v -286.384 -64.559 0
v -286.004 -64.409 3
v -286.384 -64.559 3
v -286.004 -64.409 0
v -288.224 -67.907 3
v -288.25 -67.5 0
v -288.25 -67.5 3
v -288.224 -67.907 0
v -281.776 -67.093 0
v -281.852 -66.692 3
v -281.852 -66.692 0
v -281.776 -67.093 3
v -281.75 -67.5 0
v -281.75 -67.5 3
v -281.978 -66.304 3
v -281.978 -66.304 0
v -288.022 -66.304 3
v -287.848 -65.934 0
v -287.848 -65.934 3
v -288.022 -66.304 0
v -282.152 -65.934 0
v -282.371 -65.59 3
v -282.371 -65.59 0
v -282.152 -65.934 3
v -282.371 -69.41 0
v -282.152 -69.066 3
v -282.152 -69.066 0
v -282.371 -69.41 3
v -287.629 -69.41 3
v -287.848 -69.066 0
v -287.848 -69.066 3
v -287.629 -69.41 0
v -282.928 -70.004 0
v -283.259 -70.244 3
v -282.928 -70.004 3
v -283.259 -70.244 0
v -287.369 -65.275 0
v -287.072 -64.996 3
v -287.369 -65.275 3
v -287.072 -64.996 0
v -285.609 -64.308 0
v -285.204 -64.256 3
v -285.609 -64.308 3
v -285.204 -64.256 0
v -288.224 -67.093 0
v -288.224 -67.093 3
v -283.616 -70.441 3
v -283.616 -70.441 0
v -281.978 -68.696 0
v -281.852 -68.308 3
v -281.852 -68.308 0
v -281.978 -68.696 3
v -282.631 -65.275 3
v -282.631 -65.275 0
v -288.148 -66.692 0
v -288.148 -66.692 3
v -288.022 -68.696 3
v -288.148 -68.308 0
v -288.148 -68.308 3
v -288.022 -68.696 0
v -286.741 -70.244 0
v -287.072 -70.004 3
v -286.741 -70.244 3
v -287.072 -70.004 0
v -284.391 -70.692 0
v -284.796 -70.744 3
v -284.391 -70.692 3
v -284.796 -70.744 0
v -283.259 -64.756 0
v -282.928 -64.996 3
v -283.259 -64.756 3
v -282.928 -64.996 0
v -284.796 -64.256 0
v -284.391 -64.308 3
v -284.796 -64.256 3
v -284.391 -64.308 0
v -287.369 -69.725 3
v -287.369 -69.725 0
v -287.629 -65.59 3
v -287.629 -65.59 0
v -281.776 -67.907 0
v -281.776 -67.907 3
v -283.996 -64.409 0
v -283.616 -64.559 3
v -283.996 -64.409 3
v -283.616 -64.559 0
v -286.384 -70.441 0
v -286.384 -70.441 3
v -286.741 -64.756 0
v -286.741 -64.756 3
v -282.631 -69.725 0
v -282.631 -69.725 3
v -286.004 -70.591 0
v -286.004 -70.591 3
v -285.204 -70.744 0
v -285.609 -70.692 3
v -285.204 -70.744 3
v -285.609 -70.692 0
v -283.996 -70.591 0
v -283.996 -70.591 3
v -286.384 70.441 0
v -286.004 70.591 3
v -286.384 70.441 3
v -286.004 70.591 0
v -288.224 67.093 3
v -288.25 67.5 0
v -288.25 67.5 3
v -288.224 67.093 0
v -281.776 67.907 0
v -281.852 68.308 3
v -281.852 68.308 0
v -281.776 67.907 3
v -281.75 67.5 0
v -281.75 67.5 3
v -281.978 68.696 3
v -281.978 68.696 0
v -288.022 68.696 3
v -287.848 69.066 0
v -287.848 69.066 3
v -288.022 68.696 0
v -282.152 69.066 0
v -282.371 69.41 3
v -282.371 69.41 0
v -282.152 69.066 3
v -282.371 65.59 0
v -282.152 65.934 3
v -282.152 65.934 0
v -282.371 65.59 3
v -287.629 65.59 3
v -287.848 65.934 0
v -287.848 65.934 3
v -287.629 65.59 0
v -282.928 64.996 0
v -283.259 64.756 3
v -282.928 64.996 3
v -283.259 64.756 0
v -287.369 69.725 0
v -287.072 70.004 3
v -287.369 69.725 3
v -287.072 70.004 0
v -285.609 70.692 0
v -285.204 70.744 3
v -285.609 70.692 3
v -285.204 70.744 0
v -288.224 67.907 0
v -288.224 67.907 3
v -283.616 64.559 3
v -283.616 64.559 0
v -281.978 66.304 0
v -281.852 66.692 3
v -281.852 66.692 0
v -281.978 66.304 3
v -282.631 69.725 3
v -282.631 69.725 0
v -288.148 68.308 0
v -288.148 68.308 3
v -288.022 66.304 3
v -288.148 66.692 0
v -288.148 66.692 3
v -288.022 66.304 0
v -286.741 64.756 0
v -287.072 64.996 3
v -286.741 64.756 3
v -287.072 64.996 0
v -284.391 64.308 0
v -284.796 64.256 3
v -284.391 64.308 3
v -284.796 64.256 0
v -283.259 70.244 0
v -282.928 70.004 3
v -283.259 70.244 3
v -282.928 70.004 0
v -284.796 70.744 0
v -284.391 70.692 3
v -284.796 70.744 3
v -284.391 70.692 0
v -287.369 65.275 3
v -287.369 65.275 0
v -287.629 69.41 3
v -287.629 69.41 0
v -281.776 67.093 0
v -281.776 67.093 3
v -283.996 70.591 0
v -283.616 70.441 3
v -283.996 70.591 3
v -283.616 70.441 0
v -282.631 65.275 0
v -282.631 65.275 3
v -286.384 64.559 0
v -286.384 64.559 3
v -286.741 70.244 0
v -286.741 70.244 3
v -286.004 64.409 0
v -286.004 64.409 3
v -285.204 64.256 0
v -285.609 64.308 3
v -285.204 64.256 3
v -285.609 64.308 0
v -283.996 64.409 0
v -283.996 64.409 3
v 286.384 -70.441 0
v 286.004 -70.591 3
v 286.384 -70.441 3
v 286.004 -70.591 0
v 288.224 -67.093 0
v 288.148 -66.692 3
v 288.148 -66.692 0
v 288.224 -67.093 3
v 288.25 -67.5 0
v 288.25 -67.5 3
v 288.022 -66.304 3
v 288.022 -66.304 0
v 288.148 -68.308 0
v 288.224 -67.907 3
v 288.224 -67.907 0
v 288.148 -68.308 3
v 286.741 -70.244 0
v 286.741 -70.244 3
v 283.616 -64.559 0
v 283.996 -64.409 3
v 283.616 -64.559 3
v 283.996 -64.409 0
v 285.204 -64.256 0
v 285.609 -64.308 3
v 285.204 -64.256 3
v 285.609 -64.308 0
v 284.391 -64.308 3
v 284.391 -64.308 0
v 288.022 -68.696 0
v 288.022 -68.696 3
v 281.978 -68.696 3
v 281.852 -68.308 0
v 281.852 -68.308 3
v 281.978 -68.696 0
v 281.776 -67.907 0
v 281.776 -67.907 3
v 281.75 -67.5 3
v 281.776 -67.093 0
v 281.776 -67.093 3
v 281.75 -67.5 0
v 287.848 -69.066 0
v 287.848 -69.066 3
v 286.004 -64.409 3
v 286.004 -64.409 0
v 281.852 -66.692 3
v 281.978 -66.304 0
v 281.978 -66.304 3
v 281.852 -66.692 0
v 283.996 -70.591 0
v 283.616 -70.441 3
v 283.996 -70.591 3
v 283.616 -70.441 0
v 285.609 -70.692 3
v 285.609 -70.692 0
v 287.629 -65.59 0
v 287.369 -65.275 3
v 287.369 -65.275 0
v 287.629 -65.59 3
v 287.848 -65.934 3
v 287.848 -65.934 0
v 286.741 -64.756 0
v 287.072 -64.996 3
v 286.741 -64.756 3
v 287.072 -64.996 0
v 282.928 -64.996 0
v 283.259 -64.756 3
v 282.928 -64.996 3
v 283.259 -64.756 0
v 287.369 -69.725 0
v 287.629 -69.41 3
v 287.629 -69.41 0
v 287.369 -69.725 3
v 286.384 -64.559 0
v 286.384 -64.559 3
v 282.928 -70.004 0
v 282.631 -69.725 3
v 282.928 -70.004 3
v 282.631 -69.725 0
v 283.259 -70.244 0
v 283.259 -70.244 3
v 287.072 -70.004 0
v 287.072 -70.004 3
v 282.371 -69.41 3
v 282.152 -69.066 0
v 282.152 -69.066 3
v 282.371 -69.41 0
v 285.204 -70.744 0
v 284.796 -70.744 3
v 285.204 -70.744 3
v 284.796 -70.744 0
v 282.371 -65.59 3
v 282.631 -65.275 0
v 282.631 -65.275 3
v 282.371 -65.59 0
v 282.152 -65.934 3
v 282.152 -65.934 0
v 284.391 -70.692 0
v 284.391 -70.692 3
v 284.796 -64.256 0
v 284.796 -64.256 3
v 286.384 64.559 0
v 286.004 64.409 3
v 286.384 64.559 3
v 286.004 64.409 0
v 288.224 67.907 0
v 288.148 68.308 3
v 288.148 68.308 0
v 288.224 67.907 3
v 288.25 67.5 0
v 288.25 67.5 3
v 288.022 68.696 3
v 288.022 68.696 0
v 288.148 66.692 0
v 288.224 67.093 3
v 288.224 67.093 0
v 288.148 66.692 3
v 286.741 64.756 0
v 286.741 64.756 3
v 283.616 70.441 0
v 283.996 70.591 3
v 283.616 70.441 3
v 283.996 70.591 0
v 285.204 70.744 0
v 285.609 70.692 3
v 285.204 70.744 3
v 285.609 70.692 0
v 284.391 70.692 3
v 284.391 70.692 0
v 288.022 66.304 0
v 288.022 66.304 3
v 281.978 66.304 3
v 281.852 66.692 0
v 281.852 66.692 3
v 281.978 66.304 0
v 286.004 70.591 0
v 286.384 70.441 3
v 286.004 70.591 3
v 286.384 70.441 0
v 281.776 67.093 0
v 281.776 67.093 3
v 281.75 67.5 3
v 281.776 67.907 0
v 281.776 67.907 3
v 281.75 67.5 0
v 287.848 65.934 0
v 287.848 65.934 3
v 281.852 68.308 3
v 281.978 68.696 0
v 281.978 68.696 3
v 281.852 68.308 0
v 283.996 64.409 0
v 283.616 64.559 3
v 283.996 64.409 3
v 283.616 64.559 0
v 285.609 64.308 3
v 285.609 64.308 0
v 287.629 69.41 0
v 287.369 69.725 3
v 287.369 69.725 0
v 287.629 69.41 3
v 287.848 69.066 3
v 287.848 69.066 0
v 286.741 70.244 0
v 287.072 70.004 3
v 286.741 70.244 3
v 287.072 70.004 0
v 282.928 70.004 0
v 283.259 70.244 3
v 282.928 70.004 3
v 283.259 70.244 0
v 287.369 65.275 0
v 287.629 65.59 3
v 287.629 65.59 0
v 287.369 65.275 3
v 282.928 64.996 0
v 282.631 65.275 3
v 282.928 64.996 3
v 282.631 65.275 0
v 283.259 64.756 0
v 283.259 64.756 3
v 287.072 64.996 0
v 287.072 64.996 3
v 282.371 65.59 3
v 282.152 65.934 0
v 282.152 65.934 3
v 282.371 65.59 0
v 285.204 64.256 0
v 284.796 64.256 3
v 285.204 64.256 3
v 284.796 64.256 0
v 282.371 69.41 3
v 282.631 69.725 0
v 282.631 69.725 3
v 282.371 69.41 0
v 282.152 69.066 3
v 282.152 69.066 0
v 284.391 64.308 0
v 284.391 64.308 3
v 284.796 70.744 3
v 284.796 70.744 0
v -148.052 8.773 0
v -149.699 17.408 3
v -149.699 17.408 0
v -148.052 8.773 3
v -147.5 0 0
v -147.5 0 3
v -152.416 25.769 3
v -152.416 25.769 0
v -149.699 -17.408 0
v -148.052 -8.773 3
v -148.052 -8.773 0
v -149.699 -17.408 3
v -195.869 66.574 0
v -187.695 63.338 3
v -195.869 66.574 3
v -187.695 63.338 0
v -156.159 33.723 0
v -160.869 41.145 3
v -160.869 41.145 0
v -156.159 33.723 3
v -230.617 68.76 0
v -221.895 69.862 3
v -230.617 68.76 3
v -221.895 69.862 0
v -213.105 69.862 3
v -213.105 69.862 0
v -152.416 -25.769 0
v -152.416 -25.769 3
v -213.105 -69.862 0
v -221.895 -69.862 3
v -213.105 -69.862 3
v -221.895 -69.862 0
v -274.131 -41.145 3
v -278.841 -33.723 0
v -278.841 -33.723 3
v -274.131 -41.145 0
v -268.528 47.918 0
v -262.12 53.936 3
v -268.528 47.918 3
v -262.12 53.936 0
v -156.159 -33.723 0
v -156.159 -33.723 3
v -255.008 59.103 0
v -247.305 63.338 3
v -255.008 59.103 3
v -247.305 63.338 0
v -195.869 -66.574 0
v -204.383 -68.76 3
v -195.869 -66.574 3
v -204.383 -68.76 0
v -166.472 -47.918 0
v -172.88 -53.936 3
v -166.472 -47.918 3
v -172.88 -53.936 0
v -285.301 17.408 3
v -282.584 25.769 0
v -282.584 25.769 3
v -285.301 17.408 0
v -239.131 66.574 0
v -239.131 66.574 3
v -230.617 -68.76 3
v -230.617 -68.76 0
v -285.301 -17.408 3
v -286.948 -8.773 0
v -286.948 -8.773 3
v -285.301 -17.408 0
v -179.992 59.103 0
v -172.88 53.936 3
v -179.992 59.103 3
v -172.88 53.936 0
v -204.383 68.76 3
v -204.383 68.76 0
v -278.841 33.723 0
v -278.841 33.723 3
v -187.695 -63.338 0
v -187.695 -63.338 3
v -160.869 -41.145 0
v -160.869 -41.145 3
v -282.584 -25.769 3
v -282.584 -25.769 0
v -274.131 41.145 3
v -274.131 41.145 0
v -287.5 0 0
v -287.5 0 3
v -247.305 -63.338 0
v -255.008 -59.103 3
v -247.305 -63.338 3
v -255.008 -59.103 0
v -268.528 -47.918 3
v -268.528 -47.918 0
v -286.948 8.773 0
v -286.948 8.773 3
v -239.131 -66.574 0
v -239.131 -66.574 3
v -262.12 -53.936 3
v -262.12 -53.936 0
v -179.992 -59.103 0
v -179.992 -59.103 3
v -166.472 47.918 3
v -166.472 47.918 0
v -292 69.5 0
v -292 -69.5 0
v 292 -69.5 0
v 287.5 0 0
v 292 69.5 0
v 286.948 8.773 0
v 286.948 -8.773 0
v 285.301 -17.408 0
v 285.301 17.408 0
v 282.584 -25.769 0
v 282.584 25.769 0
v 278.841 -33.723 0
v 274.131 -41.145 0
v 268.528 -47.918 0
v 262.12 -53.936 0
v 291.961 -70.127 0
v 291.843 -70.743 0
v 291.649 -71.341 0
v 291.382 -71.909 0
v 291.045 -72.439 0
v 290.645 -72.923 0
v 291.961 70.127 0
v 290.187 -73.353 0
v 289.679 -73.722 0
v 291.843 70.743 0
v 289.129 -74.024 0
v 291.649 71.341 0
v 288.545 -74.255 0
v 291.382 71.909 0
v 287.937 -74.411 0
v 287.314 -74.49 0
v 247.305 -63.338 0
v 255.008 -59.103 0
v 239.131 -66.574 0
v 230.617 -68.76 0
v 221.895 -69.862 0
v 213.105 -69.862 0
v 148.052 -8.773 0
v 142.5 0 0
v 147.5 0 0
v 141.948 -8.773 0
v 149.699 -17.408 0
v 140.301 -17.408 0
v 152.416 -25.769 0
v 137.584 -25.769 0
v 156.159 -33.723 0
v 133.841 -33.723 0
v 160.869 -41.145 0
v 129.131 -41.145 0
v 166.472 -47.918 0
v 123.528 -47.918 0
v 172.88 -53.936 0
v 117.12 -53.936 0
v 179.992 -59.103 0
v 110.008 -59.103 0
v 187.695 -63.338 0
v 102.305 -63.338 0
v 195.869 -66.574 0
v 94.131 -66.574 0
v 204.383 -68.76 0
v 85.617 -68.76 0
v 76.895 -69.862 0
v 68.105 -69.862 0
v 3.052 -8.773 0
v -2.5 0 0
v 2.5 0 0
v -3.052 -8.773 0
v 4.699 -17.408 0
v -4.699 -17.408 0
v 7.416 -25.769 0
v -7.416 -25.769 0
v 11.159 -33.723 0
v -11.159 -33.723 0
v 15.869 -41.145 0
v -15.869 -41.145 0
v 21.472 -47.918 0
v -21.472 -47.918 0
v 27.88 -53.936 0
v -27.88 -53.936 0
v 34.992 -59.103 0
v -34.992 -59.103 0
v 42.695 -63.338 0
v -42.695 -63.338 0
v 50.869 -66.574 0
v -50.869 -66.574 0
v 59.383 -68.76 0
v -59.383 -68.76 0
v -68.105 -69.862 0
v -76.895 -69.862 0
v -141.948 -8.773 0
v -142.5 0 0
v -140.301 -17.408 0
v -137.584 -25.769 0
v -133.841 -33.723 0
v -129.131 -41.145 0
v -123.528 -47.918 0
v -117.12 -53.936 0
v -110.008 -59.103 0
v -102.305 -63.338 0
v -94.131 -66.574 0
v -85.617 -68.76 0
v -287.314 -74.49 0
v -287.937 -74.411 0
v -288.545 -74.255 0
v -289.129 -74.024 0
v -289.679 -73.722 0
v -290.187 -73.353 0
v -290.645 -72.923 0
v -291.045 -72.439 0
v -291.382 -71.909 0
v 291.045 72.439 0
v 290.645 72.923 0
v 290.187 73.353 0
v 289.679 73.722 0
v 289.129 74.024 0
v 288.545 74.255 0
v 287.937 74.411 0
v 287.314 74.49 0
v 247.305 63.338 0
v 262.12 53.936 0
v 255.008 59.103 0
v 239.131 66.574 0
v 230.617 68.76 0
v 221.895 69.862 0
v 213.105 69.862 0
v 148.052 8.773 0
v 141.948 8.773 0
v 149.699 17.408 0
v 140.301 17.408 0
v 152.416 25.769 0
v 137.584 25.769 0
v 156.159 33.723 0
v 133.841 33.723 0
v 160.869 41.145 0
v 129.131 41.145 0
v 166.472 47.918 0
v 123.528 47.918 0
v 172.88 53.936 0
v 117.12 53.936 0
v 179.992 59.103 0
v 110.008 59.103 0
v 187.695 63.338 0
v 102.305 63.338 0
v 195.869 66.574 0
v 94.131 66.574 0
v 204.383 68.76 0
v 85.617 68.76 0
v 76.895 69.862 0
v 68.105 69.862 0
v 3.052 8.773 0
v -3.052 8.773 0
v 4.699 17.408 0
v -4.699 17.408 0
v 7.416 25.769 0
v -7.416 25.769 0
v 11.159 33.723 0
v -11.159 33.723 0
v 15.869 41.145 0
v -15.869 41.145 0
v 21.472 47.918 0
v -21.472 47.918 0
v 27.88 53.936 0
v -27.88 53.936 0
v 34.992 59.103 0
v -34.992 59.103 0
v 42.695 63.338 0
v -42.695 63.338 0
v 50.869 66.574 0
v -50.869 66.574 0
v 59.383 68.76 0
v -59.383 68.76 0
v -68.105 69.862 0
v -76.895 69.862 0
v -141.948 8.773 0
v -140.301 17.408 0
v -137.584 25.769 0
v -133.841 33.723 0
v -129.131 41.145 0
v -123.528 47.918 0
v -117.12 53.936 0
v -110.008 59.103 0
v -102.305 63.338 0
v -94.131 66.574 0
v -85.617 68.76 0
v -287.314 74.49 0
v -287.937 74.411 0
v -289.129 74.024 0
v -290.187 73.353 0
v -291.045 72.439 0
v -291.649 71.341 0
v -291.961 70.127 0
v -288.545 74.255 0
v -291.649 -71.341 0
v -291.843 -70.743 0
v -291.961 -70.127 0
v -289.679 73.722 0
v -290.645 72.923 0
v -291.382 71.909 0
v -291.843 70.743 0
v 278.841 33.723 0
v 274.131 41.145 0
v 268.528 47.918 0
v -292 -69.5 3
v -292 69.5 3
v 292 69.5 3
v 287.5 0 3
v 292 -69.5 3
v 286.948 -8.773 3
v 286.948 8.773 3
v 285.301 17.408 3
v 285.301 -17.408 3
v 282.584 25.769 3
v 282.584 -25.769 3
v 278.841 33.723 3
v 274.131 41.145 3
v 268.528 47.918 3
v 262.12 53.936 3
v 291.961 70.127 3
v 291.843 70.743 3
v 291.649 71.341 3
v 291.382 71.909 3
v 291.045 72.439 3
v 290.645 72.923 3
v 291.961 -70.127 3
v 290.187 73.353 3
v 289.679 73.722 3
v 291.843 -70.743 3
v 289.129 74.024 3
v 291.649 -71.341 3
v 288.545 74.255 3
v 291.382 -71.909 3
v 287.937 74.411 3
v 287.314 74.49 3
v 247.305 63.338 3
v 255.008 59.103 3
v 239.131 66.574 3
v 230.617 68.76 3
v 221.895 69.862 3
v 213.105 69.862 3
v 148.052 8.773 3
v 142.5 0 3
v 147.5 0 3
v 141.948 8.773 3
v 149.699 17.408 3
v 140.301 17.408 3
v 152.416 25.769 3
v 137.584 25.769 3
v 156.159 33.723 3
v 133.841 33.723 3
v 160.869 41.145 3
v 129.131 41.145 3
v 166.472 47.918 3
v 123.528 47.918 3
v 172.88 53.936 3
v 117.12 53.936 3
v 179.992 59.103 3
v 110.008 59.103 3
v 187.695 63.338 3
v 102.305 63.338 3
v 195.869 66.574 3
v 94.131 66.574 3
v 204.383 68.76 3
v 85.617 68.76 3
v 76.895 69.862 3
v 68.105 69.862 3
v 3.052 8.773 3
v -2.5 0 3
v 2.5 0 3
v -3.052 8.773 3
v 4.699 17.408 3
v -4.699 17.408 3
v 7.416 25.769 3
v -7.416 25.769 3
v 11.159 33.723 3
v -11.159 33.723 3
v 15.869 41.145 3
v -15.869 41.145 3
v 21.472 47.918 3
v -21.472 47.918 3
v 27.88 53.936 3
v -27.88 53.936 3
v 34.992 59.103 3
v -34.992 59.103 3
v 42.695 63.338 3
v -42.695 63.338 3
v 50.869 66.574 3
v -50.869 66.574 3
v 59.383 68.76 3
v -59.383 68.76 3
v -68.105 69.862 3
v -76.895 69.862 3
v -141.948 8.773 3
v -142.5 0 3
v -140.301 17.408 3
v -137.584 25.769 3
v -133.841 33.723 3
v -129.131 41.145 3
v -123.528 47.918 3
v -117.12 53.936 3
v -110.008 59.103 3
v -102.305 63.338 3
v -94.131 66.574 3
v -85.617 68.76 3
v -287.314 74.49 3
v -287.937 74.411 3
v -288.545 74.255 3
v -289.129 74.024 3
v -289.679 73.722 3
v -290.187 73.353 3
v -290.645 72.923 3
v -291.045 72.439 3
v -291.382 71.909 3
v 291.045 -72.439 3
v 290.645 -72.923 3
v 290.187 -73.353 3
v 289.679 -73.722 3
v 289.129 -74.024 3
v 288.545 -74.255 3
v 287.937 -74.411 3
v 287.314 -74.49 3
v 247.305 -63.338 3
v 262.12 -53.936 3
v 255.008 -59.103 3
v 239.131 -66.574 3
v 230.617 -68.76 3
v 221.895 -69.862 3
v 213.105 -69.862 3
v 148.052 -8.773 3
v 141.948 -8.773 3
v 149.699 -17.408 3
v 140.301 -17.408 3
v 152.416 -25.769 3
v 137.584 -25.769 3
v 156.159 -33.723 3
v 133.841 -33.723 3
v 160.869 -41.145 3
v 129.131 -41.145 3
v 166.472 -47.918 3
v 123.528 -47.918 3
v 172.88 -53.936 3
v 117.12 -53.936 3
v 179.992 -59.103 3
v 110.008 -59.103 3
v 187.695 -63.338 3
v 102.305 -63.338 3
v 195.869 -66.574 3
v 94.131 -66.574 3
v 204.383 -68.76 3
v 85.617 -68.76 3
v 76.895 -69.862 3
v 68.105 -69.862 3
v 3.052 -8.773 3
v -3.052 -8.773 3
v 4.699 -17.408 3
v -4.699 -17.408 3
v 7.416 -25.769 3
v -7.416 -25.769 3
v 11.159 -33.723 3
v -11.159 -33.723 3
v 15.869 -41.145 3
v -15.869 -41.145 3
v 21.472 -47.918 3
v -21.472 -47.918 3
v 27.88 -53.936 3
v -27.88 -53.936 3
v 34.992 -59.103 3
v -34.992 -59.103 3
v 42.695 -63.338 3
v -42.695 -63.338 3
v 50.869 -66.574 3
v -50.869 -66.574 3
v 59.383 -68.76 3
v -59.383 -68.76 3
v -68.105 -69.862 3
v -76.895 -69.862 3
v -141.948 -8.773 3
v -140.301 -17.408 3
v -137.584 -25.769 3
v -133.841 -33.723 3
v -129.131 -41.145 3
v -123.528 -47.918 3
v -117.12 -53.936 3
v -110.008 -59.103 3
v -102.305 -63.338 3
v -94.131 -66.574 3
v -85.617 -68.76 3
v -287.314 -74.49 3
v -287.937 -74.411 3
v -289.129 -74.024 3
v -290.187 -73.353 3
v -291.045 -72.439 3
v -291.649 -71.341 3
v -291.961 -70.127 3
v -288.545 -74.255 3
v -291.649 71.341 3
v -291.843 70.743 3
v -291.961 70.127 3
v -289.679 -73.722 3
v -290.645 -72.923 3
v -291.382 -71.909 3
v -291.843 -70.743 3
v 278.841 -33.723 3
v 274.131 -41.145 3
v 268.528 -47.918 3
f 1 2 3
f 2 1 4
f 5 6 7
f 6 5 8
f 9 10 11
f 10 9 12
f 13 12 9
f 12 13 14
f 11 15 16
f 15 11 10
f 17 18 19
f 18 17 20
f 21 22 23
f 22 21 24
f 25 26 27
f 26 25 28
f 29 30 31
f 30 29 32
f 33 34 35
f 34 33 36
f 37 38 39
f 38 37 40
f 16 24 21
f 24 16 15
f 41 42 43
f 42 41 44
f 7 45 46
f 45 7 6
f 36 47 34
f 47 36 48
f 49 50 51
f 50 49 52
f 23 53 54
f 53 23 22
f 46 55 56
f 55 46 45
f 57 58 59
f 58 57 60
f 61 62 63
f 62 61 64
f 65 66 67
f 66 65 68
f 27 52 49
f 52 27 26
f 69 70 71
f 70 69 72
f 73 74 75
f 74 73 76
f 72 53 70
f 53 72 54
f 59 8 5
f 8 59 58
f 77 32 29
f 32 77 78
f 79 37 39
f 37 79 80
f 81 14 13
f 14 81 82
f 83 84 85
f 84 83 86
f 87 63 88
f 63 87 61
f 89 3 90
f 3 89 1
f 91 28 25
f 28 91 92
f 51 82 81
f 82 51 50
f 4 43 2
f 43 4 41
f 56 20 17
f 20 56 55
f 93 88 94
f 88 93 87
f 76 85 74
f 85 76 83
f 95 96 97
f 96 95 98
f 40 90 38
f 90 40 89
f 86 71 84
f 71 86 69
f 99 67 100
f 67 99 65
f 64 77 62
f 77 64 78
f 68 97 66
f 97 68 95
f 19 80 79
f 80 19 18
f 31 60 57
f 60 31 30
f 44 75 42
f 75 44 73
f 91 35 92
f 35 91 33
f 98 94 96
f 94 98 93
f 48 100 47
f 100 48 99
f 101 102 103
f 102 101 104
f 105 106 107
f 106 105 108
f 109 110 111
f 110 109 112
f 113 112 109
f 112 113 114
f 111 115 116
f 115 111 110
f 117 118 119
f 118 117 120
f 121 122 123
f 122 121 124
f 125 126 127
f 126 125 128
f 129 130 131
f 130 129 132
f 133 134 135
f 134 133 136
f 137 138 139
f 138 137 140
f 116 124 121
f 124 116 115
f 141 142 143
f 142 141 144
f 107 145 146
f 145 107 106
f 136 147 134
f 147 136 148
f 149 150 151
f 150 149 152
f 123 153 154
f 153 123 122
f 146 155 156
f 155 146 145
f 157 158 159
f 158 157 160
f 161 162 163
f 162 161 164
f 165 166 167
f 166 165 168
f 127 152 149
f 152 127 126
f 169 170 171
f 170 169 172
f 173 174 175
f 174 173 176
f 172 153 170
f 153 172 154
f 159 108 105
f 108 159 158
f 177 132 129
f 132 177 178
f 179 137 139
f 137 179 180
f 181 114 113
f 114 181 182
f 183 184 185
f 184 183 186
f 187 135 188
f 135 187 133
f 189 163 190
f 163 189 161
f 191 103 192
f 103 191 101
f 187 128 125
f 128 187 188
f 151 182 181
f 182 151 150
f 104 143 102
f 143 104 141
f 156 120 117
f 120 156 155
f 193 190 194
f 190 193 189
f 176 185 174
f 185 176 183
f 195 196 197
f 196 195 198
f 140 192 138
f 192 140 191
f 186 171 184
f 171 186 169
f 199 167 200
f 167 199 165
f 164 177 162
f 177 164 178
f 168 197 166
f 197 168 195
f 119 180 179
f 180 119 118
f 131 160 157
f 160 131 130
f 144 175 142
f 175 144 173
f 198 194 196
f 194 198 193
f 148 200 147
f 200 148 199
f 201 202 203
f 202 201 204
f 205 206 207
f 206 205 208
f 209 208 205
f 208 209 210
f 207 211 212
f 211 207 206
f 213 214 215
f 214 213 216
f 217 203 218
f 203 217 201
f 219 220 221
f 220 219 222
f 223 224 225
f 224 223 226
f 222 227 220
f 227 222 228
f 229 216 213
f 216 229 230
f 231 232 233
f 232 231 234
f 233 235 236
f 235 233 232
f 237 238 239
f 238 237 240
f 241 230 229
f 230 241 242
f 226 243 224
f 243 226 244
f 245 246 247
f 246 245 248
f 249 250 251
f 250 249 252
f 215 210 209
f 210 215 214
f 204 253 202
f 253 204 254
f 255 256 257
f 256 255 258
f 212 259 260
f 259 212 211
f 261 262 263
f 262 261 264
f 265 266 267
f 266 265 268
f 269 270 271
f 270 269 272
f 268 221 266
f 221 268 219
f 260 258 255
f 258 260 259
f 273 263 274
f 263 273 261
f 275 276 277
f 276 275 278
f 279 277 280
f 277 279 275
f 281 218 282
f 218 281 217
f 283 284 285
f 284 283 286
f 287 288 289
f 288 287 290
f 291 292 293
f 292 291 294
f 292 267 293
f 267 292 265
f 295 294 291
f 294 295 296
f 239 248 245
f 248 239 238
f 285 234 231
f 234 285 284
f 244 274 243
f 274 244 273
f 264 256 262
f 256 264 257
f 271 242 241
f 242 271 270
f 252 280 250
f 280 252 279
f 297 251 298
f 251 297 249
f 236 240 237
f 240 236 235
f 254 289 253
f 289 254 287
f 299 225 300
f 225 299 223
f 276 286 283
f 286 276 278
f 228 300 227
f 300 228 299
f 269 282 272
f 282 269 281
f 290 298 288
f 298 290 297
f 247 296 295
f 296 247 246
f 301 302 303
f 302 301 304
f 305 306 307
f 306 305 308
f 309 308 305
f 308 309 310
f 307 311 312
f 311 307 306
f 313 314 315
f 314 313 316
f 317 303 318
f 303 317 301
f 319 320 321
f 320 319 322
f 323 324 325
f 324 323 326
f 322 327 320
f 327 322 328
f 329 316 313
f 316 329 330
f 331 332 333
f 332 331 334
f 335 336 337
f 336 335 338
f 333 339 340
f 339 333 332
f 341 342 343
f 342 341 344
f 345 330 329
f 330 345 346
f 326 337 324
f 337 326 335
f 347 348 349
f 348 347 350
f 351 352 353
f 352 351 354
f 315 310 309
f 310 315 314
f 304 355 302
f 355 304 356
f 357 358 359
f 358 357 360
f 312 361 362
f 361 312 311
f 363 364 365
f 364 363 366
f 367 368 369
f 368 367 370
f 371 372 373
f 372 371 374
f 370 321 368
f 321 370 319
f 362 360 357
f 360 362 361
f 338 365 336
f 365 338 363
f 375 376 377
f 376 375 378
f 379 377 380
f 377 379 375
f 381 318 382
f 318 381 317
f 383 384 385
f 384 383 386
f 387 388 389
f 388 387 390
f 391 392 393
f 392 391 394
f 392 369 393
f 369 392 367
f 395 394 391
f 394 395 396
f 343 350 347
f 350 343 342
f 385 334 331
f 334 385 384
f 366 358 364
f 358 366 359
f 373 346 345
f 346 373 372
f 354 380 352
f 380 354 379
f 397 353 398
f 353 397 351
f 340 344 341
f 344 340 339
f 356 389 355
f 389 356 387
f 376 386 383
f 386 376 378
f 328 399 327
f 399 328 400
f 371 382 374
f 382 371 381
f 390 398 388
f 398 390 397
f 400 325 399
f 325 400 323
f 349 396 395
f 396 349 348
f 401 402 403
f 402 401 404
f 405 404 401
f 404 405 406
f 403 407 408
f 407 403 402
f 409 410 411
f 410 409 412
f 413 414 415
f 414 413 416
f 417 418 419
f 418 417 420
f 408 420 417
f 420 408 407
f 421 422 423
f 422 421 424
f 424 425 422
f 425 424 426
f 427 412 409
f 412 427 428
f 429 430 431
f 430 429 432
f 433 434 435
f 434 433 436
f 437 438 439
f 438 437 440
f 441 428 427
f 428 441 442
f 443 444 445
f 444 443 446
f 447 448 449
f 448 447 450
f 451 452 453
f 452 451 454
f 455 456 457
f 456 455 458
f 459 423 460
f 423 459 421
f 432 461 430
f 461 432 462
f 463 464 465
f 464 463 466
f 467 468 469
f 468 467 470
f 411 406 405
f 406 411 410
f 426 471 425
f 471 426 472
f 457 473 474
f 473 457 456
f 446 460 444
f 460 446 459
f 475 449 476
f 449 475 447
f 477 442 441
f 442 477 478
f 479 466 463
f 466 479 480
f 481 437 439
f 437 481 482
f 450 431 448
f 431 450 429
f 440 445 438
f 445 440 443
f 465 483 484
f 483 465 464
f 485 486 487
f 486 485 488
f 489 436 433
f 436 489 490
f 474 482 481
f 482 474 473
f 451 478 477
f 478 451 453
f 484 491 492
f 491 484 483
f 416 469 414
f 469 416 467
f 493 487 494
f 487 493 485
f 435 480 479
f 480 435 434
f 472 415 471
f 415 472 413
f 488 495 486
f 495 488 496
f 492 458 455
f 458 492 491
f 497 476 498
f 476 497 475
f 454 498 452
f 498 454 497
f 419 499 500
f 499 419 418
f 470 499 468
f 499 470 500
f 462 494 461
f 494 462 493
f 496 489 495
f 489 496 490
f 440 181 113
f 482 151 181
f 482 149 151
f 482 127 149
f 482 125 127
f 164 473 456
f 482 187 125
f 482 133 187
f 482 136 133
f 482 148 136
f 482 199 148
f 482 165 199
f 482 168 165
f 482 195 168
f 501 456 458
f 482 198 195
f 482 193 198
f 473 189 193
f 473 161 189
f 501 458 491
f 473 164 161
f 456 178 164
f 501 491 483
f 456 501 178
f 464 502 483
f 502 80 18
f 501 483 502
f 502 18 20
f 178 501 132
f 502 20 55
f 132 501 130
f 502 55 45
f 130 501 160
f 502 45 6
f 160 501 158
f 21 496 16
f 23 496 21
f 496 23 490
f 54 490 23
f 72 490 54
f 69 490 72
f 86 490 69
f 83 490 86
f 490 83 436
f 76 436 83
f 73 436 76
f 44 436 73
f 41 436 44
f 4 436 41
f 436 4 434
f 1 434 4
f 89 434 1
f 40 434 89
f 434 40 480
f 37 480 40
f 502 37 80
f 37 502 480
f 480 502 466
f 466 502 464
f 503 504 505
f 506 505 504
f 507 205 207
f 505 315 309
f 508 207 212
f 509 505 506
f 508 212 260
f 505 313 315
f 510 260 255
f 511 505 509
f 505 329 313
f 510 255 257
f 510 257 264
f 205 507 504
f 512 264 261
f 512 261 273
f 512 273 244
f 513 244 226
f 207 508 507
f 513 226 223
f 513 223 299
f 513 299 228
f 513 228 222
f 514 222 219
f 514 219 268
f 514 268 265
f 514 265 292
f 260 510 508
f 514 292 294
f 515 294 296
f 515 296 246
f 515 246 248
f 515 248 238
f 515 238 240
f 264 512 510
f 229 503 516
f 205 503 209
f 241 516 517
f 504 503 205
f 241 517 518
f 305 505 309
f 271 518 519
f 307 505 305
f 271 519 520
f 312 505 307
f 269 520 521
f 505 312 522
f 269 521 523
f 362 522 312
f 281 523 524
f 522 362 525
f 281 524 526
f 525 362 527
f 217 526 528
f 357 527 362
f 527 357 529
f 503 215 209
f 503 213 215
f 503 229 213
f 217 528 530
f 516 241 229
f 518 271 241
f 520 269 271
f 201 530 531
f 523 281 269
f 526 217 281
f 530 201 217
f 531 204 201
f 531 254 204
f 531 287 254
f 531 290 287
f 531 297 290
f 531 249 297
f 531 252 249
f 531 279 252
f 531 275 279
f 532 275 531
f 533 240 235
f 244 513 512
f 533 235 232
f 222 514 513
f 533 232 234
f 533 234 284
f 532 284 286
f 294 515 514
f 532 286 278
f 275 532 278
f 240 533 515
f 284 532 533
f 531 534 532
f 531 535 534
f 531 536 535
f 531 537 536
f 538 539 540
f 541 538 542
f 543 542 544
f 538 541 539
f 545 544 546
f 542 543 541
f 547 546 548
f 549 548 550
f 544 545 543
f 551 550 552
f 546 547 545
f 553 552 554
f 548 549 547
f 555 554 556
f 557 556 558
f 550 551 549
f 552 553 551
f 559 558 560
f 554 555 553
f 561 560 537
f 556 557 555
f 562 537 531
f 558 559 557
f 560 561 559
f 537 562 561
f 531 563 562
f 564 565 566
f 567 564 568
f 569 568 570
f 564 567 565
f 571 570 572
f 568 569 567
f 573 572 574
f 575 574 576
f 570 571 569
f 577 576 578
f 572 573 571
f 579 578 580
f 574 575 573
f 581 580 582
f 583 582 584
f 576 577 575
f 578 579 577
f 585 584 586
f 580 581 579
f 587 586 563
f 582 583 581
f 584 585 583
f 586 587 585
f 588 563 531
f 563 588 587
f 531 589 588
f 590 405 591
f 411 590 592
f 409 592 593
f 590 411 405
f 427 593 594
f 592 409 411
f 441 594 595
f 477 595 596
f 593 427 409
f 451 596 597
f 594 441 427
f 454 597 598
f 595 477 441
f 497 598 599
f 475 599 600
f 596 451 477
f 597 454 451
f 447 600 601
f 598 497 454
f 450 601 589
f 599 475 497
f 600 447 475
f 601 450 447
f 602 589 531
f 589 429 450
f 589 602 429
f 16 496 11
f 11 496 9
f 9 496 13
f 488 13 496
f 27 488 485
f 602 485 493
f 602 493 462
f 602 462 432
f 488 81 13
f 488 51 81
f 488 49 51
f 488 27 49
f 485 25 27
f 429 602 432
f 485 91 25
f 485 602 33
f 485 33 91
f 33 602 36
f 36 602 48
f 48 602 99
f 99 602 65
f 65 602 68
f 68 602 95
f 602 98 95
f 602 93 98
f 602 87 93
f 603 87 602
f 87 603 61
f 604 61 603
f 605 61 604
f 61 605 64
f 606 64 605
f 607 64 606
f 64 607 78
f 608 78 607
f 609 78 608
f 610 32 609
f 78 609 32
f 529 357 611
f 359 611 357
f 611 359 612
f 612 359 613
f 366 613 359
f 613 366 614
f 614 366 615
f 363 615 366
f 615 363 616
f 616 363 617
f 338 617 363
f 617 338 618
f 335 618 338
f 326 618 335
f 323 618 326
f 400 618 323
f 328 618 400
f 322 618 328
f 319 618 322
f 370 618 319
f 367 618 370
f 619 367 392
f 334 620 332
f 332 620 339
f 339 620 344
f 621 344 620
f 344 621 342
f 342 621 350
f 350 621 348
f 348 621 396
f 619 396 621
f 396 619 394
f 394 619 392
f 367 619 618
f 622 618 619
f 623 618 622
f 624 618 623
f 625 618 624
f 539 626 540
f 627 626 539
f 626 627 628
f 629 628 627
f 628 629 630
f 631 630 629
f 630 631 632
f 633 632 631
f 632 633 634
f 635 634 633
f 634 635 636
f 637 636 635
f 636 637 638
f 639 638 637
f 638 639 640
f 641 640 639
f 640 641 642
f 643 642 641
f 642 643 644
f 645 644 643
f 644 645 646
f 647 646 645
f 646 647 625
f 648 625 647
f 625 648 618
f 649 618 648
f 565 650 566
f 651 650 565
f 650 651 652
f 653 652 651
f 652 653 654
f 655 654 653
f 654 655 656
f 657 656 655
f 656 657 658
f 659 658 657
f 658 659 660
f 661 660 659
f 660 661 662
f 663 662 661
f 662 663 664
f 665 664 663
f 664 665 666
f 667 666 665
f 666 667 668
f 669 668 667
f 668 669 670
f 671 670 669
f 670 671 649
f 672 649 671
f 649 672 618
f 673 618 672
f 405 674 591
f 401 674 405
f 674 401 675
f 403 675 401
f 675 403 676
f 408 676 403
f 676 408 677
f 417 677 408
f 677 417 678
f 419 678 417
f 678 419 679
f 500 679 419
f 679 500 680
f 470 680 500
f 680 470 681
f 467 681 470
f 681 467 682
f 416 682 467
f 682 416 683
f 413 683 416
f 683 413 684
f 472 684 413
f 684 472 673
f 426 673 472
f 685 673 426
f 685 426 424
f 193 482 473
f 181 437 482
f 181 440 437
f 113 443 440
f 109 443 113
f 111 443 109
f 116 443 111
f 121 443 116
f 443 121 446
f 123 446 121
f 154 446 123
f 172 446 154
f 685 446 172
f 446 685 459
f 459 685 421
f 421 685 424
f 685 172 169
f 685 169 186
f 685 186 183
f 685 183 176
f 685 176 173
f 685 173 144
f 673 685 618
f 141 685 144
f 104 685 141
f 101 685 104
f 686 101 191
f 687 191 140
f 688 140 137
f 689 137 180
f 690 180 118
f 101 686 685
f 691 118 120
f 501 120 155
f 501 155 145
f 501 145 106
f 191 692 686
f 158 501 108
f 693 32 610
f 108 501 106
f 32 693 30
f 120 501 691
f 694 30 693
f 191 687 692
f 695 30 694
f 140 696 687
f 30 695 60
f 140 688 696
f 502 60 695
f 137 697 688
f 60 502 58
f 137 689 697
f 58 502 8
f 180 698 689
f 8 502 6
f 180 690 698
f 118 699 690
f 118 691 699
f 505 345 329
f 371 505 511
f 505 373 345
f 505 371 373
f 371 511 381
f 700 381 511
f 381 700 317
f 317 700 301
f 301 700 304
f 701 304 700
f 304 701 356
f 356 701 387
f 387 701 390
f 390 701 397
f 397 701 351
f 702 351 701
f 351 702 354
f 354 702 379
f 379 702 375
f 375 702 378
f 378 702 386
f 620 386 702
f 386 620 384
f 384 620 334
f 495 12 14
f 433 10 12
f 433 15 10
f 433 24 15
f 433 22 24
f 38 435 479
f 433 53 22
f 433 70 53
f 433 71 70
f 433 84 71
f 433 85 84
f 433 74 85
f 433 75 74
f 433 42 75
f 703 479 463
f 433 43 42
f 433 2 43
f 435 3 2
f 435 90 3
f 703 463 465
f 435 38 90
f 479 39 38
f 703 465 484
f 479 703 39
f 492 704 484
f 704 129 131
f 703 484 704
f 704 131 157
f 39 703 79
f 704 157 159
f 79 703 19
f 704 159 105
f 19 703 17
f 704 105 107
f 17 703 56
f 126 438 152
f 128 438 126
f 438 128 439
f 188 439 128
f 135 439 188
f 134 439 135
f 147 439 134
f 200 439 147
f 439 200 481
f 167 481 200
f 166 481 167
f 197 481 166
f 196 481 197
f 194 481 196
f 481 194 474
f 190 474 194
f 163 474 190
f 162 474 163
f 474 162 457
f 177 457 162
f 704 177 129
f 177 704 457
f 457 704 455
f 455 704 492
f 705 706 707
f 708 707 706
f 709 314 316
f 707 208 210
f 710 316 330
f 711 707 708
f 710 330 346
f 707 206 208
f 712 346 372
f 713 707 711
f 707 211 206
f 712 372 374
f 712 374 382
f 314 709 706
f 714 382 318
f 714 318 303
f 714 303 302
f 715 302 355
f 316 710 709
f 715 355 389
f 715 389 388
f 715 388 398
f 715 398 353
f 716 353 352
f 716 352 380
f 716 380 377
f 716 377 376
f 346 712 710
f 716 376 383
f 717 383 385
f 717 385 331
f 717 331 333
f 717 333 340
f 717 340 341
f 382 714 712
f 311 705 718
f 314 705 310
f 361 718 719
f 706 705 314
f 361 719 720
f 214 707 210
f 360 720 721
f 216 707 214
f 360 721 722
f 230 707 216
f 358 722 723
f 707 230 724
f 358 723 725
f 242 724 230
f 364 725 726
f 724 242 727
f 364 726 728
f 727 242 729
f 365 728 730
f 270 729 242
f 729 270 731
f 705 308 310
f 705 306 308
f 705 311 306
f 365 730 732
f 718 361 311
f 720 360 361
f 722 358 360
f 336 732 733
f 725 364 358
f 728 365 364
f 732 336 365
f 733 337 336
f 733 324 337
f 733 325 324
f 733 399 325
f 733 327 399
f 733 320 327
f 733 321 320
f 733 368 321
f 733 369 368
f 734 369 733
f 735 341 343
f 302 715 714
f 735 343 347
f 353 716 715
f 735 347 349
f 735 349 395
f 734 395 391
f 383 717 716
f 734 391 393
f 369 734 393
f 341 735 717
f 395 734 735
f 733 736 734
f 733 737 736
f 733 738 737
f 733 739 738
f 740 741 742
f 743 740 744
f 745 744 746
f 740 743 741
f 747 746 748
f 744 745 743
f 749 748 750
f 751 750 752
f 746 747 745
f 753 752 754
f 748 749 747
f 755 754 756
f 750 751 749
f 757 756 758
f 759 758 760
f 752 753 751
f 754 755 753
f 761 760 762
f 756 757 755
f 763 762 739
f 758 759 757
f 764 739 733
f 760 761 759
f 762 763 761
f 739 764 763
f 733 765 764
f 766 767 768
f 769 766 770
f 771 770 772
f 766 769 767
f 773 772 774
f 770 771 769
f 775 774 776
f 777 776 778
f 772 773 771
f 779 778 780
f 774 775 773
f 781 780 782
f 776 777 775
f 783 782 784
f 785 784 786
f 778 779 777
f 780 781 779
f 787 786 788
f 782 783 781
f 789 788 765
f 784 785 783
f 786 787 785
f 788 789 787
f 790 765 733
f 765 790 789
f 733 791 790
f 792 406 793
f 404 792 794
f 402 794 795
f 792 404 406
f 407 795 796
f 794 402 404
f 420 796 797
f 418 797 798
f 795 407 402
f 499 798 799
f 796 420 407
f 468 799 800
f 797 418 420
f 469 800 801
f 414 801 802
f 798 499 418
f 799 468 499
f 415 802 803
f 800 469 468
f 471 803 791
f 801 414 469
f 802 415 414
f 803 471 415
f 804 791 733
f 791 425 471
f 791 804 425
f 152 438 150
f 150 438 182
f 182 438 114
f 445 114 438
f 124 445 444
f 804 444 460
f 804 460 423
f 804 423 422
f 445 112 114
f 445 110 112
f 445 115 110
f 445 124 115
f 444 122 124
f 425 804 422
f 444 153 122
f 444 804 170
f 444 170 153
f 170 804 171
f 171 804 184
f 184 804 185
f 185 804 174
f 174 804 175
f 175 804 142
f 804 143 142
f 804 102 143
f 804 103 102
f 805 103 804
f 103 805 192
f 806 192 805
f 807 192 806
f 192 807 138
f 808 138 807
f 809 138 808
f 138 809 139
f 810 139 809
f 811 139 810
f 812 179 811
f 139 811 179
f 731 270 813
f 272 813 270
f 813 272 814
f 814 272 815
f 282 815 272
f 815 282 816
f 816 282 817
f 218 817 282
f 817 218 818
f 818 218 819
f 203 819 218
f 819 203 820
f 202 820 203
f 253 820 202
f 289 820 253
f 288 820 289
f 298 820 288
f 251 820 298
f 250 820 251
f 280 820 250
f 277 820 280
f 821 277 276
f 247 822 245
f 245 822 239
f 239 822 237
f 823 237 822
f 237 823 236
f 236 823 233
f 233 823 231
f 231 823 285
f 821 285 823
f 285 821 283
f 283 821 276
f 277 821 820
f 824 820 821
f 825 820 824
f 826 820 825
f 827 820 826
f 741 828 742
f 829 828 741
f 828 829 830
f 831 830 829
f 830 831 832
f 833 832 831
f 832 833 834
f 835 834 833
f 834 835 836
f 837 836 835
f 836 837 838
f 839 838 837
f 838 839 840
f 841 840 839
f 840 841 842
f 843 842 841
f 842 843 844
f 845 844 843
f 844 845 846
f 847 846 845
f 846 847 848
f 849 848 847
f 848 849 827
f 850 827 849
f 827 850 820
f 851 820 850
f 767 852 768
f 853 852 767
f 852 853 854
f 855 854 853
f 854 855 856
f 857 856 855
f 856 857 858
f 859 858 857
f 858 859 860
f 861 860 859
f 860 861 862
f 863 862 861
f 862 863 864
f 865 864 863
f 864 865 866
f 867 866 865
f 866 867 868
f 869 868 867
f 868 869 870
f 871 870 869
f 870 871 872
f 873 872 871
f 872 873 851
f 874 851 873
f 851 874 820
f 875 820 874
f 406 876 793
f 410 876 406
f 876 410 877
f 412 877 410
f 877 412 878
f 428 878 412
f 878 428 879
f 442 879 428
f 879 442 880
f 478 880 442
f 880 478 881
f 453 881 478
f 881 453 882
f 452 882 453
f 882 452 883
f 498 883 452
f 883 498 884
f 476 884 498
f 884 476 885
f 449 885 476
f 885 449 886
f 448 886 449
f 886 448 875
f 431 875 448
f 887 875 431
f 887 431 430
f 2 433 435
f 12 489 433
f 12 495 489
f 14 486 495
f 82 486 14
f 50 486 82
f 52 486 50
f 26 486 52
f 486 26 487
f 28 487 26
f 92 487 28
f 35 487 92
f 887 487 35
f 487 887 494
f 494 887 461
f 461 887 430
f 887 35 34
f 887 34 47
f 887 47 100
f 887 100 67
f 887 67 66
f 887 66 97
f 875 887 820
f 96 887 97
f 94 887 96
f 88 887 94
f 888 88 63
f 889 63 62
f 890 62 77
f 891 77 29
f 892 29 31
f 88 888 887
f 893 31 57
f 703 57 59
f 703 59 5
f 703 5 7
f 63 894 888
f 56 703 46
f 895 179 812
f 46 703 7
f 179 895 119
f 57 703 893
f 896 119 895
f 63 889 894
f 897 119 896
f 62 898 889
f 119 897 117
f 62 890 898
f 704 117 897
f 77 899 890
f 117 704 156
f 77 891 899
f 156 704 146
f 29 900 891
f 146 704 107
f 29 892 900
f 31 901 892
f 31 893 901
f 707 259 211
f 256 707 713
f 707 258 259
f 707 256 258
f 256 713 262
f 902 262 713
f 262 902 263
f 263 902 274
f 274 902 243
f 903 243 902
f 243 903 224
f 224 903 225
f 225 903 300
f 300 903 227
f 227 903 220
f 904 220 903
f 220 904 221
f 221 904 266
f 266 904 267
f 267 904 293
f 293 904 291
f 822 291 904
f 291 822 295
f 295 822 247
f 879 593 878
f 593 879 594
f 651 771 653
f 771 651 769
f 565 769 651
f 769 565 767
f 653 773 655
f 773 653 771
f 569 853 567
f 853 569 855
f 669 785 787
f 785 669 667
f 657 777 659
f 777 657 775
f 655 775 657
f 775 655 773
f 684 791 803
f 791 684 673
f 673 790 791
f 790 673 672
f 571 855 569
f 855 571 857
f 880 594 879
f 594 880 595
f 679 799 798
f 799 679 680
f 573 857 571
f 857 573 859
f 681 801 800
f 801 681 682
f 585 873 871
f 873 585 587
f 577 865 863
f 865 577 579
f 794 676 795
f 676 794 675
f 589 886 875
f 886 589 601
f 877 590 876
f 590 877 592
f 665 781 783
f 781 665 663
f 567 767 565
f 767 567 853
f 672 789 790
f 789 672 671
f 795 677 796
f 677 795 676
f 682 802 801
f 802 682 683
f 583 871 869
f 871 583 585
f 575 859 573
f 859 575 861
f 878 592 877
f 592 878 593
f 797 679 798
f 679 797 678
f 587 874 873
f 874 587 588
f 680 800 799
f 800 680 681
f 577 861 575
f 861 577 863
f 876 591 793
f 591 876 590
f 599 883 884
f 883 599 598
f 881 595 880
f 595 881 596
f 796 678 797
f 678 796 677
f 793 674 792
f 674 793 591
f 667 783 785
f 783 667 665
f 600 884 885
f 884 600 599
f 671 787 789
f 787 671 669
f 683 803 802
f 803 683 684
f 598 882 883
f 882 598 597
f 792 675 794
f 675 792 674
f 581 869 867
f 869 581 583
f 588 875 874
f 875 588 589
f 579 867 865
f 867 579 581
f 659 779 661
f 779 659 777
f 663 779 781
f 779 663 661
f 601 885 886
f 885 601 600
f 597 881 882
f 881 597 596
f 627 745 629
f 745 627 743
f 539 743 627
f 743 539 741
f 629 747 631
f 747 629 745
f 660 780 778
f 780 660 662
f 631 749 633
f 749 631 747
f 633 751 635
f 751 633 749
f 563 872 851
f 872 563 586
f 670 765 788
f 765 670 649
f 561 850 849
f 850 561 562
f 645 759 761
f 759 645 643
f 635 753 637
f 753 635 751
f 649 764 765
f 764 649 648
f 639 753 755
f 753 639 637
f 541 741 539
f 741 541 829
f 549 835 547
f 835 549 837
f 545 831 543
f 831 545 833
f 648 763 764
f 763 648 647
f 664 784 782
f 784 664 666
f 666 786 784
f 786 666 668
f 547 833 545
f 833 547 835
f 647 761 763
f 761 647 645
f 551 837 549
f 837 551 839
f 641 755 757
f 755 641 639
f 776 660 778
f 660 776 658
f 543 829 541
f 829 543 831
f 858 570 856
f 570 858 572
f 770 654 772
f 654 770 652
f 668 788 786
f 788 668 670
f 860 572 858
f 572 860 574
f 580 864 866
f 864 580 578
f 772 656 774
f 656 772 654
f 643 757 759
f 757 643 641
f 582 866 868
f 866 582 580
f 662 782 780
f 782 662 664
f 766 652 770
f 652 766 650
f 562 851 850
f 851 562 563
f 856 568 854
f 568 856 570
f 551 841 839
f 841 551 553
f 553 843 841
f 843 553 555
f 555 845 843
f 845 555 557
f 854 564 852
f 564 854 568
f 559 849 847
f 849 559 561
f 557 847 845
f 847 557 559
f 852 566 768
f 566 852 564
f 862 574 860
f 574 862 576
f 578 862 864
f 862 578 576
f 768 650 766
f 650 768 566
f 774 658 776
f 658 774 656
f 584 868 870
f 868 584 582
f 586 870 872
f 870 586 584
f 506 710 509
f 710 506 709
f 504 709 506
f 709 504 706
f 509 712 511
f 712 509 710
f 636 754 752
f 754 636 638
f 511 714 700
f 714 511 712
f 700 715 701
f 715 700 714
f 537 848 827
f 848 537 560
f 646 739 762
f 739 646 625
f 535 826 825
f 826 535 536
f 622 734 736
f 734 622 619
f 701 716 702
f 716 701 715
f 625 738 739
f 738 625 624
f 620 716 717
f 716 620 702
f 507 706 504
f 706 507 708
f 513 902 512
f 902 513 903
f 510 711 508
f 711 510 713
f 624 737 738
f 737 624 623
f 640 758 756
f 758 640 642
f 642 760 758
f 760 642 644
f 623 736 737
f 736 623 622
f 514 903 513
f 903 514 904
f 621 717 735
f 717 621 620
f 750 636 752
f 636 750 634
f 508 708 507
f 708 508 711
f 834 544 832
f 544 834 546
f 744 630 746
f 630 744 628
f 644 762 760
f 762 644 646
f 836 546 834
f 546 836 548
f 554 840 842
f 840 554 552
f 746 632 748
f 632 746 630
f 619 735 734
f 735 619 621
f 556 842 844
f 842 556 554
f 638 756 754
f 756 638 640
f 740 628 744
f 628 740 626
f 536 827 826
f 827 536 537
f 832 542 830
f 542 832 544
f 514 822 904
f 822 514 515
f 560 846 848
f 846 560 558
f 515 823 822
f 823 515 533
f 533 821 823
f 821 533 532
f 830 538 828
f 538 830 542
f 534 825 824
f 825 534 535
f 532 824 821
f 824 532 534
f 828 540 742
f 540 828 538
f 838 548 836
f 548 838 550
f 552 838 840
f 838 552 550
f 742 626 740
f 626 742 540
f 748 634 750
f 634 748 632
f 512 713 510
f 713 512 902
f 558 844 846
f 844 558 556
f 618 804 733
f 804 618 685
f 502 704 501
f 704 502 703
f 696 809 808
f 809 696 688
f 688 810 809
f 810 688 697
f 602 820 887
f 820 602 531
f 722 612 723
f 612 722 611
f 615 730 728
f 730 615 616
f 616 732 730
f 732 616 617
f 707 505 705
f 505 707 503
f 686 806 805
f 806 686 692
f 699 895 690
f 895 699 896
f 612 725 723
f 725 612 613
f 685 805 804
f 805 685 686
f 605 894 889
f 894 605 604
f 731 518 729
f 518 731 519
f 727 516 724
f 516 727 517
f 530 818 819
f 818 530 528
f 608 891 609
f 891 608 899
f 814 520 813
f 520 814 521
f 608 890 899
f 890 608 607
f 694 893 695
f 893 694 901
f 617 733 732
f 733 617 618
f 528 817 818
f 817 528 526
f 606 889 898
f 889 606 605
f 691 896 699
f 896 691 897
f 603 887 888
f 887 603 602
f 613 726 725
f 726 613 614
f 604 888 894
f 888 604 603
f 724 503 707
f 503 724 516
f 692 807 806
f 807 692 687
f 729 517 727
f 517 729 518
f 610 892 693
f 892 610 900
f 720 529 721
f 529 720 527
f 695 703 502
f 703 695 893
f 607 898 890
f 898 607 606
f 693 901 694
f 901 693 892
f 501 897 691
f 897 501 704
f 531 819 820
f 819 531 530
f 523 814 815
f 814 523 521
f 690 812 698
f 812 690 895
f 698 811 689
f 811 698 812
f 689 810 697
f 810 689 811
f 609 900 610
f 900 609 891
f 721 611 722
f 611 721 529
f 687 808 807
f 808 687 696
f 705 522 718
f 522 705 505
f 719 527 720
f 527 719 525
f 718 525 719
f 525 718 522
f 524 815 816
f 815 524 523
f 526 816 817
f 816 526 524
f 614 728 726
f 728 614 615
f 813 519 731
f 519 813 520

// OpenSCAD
$fn = 50;


difference() {
	union() {
		hull() {
			translate(v = [-287.0000000000, 69.5000000000, 0]) {
				cylinder(h = 3, r = 5);
			}
			translate(v = [287.0000000000, 69.5000000000, 0]) {
				cylinder(h = 3, r = 5);
			}
			translate(v = [-287.0000000000, -69.5000000000, 0]) {
				cylinder(h = 3, r = 5);
			}
			translate(v = [287.0000000000, -69.5000000000, 0]) {
				cylinder(h = 3, r = 5);
			}
		}
	}
	union() {
		#translate(v = [-285.0000000000, -67.5000000000, -100.0000000000]) {
			cylinder(h = 200, r = 3.2500000000);
		}
		#translate(v = [-285.0000000000, 67.5000000000, -100.0000000000]) {
			cylinder(h = 200, r = 3.2500000000);
		}
		#translate(v = [285.0000000000, -67.5000000000, -100.0000000000]) {
			cylinder(h = 200, r = 3.2500000000);
		}
		#translate(v = [285.0000000000, 67.5000000000, -100.0000000000]) {
			cylinder(h = 200, r = 3.2500000000);
		}
		#translate(v = [-217.5000000000, 0, 0]) {
			cylinder(h = 3, r = 70.0000000000);
		}
		#translate(v = [-72.5000000000, 0, 0]) {
			cylinder(h = 3, r = 70.0000000000);
		}
		#translate(v = [72.5000000000, 0, 0]) {
			cylinder(h = 3, r = 70.0000000000);
		}
		#translate(v = [217.5000000000, 0, 0]) {
			cylinder(h = 3, r = 70.0000000000);
		}
	}
}
